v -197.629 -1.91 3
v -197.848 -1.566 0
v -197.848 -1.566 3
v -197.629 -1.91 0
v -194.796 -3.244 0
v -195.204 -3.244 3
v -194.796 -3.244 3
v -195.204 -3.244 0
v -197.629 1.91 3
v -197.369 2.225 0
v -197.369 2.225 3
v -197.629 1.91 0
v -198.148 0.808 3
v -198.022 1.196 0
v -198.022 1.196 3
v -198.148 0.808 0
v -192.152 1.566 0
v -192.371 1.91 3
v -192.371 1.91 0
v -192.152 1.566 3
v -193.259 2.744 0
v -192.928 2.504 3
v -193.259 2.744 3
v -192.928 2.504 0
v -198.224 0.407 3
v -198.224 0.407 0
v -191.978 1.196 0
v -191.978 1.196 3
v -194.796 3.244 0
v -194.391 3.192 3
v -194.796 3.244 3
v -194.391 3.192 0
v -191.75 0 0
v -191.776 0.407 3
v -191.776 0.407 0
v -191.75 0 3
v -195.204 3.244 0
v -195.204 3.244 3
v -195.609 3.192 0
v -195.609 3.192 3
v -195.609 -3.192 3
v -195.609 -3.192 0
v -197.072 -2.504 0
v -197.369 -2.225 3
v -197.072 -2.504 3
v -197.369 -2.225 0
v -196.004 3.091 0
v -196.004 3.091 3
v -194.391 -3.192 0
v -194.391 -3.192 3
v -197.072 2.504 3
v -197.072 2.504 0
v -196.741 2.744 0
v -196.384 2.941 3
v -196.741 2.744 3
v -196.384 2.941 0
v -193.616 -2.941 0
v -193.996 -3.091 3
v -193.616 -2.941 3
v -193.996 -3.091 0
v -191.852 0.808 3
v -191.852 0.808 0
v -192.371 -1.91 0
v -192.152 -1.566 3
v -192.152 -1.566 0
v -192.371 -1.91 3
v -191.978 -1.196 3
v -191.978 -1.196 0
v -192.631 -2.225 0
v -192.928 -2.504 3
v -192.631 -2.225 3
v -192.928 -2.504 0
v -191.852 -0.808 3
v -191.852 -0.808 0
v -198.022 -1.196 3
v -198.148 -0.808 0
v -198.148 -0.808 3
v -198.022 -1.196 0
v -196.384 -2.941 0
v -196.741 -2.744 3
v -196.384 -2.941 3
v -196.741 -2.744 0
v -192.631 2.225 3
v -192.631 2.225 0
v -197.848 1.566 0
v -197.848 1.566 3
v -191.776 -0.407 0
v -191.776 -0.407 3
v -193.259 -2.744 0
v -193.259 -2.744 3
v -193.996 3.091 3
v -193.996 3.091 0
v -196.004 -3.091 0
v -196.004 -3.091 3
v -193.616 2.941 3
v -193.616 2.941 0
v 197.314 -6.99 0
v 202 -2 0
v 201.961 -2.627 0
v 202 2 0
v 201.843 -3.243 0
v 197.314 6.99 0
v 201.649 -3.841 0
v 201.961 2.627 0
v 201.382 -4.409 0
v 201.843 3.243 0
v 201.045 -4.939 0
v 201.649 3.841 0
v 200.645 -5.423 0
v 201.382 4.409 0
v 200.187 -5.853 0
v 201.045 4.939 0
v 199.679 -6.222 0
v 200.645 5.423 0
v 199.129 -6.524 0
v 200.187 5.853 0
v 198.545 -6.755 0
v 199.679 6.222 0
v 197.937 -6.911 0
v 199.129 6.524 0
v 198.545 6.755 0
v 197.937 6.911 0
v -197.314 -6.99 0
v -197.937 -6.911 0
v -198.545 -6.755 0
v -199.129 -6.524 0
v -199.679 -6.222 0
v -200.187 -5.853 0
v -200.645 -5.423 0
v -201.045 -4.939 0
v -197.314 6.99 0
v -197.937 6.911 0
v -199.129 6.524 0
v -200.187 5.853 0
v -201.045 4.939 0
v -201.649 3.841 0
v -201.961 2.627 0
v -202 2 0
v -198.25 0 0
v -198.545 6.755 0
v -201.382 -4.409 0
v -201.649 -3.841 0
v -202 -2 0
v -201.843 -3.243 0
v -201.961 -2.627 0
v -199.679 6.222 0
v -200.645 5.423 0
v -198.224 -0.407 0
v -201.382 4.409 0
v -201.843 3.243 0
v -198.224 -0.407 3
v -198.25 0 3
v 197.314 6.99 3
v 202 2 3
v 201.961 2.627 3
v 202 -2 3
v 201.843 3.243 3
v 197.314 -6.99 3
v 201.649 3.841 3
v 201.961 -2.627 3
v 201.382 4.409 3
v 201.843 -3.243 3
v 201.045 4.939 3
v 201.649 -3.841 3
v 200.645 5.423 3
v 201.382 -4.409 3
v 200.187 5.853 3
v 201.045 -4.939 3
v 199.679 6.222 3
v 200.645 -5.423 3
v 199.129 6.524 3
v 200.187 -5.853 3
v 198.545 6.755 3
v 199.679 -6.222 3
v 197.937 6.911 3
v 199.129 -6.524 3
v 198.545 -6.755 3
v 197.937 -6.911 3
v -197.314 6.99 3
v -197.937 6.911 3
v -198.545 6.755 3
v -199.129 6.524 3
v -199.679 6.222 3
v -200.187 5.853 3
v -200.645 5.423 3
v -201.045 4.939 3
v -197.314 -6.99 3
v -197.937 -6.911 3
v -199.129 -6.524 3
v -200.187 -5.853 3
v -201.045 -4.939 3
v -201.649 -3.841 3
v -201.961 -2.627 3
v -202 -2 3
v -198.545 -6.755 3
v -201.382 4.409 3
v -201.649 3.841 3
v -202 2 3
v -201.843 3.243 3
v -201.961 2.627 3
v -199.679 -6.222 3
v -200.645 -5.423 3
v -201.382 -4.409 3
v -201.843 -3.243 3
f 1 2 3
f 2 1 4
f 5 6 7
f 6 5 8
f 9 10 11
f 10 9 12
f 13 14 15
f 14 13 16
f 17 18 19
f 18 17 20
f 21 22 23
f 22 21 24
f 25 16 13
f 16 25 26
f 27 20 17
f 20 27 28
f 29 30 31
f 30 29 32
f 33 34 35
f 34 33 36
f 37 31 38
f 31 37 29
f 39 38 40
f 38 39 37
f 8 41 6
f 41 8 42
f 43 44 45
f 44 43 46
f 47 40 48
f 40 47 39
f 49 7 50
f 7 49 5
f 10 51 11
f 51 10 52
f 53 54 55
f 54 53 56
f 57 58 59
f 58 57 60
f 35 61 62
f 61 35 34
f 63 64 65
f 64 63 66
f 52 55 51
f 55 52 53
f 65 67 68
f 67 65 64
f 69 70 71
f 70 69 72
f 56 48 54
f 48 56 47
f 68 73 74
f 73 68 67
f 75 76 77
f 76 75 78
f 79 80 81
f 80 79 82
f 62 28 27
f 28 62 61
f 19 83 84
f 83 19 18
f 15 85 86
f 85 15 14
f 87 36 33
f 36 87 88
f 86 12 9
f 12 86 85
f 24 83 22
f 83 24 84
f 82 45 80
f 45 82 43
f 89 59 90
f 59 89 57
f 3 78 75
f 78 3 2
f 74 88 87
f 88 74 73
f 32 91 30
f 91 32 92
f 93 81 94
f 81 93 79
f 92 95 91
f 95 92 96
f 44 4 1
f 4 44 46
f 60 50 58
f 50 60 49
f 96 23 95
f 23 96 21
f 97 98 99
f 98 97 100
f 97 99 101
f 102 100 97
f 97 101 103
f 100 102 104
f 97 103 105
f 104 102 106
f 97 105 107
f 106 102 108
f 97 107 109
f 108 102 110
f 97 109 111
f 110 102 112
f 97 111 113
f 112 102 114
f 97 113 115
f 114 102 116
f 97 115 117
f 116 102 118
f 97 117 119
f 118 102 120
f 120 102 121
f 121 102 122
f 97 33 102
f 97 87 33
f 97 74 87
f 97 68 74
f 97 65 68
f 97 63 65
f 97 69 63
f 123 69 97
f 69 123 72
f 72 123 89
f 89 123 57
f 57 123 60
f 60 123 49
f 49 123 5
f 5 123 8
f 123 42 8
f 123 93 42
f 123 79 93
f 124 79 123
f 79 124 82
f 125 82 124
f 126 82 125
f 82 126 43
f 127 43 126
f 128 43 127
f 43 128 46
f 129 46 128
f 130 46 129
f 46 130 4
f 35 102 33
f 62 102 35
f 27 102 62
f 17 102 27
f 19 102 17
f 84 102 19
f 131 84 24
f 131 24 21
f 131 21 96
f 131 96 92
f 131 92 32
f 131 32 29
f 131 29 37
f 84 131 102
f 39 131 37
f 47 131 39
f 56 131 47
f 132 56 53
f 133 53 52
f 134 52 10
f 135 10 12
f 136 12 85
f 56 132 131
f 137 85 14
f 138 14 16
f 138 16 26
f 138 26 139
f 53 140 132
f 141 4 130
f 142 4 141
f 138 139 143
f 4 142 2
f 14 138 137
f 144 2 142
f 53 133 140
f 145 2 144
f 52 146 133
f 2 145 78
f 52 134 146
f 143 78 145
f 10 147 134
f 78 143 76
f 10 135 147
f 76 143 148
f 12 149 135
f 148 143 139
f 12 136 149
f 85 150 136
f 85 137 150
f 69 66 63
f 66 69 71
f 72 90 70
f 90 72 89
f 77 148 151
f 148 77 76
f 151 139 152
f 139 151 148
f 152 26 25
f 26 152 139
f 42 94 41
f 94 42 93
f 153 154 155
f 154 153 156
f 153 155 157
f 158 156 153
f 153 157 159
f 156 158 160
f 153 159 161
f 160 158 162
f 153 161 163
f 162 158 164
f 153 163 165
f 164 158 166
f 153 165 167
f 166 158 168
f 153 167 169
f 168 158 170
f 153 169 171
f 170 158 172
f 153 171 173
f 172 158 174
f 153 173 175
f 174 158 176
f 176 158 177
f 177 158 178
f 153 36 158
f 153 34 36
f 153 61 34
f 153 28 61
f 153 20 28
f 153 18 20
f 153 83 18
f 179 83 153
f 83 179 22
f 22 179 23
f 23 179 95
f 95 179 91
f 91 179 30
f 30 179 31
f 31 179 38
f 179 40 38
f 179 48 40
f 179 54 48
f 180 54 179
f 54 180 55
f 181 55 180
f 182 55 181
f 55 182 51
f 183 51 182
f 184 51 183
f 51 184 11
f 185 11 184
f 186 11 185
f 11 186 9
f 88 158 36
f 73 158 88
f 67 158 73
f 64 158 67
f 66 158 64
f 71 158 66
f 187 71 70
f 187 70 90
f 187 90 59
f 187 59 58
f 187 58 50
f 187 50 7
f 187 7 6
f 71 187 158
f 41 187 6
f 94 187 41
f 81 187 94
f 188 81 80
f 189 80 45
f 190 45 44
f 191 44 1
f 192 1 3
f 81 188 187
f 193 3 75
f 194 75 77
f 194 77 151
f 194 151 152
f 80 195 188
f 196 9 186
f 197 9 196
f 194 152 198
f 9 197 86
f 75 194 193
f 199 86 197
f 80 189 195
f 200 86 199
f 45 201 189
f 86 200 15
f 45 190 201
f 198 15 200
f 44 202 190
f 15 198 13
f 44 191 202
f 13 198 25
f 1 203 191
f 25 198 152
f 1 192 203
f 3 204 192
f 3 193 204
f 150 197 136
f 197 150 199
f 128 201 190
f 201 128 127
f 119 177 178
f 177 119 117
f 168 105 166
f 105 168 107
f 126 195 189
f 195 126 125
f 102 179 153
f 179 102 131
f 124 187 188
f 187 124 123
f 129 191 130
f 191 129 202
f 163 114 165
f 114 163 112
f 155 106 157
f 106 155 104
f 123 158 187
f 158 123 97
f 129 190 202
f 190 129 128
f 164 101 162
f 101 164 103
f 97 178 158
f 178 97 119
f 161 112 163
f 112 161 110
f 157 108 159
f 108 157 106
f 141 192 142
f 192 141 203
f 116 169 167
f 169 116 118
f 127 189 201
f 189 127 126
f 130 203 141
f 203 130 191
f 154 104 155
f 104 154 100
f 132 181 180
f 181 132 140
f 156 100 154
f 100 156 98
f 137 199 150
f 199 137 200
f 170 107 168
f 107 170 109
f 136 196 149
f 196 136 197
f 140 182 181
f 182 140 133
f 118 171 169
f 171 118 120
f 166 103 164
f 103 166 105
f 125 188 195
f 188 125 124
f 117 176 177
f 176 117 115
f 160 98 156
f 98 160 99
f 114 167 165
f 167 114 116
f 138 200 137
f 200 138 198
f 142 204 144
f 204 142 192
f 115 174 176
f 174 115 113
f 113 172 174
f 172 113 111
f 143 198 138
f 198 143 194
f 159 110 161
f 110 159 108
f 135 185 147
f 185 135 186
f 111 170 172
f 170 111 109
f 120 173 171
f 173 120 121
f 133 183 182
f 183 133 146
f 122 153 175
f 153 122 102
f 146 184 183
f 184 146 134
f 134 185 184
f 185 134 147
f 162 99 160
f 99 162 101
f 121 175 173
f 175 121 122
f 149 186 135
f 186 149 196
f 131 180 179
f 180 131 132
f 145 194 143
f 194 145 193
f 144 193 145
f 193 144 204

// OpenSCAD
$fn = 50;


difference() {
	union() {
		hull() {
			translate(v = [-197.0000000000, 2.0000000000, 0]) {
				cylinder(h = 3, r = 5);
			}
			translate(v = [197.0000000000, 2.0000000000, 0]) {
				cylinder(h = 3, r = 5);
			}
			translate(v = [-197.0000000000, -2.0000000000, 0]) {
				cylinder(h = 3, r = 5);
			}
			translate(v = [197.0000000000, -2.0000000000, 0]) {
				cylinder(h = 3, r = 5);
			}
		}
	}
	union() {
		translate(v = [-195.0000000000, 0.0000000000, 0]) {
			cylinder(h = 3, r = 3.2500000000);
		}
		translate(v = [-195.0000000000, 0.0000000000, 0]) {
			cylinder(h = 3, r = 1.8000000000);
		}
		translate(v = [-195.0000000000, 0.0000000000, 0]) {
			cylinder(h = 3, r = 1.8000000000);
		}
		translate(v = [-195.0000000000, 0.0000000000, 0]) {
			cylinder(h = 3, r = 1.8000000000);
		}
	}
}
